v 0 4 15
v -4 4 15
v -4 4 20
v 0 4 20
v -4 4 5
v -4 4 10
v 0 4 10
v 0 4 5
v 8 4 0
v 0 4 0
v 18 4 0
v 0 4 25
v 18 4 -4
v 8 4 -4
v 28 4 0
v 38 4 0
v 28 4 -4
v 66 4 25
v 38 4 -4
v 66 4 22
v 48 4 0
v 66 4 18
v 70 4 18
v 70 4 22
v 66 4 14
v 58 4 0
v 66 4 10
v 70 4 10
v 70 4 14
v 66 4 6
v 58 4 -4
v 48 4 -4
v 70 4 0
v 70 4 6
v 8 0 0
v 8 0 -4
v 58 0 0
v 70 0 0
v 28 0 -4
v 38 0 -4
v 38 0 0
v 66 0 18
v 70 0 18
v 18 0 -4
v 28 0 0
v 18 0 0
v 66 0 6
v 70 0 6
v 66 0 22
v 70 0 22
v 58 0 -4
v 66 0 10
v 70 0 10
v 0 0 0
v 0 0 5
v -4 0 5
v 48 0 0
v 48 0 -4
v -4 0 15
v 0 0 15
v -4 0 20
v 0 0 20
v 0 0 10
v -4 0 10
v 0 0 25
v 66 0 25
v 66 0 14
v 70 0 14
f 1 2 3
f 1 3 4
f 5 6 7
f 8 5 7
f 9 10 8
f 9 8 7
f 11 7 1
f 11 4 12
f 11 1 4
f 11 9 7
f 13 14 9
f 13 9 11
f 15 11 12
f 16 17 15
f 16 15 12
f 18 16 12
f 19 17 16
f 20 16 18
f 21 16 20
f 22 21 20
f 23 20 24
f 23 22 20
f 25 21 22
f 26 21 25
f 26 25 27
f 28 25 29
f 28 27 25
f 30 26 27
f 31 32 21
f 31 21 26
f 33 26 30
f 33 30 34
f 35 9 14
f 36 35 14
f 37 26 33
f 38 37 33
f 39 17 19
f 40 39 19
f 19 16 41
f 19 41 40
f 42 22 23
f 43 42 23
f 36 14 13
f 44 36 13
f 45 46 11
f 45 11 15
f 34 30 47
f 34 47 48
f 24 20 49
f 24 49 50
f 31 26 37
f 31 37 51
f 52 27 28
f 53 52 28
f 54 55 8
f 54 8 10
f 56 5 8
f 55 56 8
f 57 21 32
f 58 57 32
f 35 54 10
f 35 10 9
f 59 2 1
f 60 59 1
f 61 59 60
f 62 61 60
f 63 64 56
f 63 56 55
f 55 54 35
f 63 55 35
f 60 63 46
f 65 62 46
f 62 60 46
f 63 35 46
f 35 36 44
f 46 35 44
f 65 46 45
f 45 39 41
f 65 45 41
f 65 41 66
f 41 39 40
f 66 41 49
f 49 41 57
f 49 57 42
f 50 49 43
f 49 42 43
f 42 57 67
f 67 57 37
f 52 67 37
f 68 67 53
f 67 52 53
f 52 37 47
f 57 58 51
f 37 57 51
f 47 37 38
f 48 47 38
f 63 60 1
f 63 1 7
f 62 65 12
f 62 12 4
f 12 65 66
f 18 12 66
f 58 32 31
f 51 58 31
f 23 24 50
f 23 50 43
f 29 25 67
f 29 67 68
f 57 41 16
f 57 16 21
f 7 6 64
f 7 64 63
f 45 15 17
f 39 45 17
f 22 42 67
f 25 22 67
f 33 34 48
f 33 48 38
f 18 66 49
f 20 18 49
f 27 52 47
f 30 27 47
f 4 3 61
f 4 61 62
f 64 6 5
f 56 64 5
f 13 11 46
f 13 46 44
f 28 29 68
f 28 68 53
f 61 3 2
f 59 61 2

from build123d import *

# Parameters (mm, degrees)
SKETCH1_W           = 66
SKETCH1_H           = 25
BOSS_EXTRUDE1_DEPTH = 4
SKETCH2_W           = 4
SKETCH2_H           = 5
BOSS_EXTRUDE2_DEPTH = 4
LPATTERN1_COUNT     = 2
LPATTERN1_PITCH     = 10
SKETCH3_W           = 10
SKETCH3_H           = 4
BOSS_EXTRUDE3_DEPTH = 4
LPATTERN2_COUNT     = 2
LPATTERN2_PITCH     = 20
LPATTERN2_COL_COUNT = 2
LPATTERN2_COL_PITCH = 20
SKETCH5_W           = 4
SKETCH5_H           = 6
SKETCH5_H_2         = 4
BOSS_EXTRUDE4_DEPTH = 4


with BuildPart() as part:
    # Sketch1 → Boss-Extrude1 (new body)
    with BuildSketch(Plane(origin=(0, 0, 0), x_dir=(1, 0, 0), z_dir=(0, 1, 0))):
        with Locations((33, -12.5)):
            Rectangle(SKETCH1_W, SKETCH1_H)
    extrude(amount=BOSS_EXTRUDE1_DEPTH)

    # Sketch2 → Boss-Extrude2 (add, through all)
    with BuildSketch(Plane(origin=(0, 4, 0), x_dir=(1, 0, 0), z_dir=(0, 1, 0))):
        with Locations((-2, -7.5)):
            Rectangle(SKETCH2_W, SKETCH2_H)
    boss_extrude2 = extrude(amount=-BOSS_EXTRUDE2_DEPTH)

    # LPattern1: Boss-Extrude2 ×2
    with Locations(*[(0, 0, i * LPATTERN1_PITCH) for i in range(1, LPATTERN1_COUNT)]):
        add(boss_extrude2)

    # Sketch3 → Boss-Extrude3 (add, through all)
    with BuildSketch(Plane(origin=(0, 4, 0), x_dir=(1, 0, 0), z_dir=(0, 1, 0))):
        with Locations((33, 2)):
            Rectangle(SKETCH3_W, SKETCH3_H)
    boss_extrude3 = extrude(amount=-BOSS_EXTRUDE3_DEPTH)

    # LPattern2: Boss-Extrude3 ×2
    with Locations(*[(i * LPATTERN2_PITCH, 0, 0) for i in range(1, LPATTERN2_COUNT)]):
        add(boss_extrude3)

    # LPattern2 col: Boss-Extrude3 ×2
    with Locations(*[(-i * LPATTERN2_COL_PITCH, 0, 0) for i in range(1, LPATTERN2_COL_COUNT)]):
        add(boss_extrude3)

    # Sketch5 → Boss-Extrude4 (add, through all)
    with BuildSketch(Plane(origin=(0, 4, 0), x_dir=(1, 0, 0), z_dir=(0, 1, 0))):
        with Locations((68, -3)):
            Rectangle(SKETCH5_W, SKETCH5_H)
        with Locations((68, -12)):
            Rectangle(SKETCH5_W, SKETCH5_H_2)
        with Locations((68, -20)):
            Rectangle(SKETCH5_W, SKETCH5_H_2)
    extrude(amount=-BOSS_EXTRUDE4_DEPTH)


solid = part.part
